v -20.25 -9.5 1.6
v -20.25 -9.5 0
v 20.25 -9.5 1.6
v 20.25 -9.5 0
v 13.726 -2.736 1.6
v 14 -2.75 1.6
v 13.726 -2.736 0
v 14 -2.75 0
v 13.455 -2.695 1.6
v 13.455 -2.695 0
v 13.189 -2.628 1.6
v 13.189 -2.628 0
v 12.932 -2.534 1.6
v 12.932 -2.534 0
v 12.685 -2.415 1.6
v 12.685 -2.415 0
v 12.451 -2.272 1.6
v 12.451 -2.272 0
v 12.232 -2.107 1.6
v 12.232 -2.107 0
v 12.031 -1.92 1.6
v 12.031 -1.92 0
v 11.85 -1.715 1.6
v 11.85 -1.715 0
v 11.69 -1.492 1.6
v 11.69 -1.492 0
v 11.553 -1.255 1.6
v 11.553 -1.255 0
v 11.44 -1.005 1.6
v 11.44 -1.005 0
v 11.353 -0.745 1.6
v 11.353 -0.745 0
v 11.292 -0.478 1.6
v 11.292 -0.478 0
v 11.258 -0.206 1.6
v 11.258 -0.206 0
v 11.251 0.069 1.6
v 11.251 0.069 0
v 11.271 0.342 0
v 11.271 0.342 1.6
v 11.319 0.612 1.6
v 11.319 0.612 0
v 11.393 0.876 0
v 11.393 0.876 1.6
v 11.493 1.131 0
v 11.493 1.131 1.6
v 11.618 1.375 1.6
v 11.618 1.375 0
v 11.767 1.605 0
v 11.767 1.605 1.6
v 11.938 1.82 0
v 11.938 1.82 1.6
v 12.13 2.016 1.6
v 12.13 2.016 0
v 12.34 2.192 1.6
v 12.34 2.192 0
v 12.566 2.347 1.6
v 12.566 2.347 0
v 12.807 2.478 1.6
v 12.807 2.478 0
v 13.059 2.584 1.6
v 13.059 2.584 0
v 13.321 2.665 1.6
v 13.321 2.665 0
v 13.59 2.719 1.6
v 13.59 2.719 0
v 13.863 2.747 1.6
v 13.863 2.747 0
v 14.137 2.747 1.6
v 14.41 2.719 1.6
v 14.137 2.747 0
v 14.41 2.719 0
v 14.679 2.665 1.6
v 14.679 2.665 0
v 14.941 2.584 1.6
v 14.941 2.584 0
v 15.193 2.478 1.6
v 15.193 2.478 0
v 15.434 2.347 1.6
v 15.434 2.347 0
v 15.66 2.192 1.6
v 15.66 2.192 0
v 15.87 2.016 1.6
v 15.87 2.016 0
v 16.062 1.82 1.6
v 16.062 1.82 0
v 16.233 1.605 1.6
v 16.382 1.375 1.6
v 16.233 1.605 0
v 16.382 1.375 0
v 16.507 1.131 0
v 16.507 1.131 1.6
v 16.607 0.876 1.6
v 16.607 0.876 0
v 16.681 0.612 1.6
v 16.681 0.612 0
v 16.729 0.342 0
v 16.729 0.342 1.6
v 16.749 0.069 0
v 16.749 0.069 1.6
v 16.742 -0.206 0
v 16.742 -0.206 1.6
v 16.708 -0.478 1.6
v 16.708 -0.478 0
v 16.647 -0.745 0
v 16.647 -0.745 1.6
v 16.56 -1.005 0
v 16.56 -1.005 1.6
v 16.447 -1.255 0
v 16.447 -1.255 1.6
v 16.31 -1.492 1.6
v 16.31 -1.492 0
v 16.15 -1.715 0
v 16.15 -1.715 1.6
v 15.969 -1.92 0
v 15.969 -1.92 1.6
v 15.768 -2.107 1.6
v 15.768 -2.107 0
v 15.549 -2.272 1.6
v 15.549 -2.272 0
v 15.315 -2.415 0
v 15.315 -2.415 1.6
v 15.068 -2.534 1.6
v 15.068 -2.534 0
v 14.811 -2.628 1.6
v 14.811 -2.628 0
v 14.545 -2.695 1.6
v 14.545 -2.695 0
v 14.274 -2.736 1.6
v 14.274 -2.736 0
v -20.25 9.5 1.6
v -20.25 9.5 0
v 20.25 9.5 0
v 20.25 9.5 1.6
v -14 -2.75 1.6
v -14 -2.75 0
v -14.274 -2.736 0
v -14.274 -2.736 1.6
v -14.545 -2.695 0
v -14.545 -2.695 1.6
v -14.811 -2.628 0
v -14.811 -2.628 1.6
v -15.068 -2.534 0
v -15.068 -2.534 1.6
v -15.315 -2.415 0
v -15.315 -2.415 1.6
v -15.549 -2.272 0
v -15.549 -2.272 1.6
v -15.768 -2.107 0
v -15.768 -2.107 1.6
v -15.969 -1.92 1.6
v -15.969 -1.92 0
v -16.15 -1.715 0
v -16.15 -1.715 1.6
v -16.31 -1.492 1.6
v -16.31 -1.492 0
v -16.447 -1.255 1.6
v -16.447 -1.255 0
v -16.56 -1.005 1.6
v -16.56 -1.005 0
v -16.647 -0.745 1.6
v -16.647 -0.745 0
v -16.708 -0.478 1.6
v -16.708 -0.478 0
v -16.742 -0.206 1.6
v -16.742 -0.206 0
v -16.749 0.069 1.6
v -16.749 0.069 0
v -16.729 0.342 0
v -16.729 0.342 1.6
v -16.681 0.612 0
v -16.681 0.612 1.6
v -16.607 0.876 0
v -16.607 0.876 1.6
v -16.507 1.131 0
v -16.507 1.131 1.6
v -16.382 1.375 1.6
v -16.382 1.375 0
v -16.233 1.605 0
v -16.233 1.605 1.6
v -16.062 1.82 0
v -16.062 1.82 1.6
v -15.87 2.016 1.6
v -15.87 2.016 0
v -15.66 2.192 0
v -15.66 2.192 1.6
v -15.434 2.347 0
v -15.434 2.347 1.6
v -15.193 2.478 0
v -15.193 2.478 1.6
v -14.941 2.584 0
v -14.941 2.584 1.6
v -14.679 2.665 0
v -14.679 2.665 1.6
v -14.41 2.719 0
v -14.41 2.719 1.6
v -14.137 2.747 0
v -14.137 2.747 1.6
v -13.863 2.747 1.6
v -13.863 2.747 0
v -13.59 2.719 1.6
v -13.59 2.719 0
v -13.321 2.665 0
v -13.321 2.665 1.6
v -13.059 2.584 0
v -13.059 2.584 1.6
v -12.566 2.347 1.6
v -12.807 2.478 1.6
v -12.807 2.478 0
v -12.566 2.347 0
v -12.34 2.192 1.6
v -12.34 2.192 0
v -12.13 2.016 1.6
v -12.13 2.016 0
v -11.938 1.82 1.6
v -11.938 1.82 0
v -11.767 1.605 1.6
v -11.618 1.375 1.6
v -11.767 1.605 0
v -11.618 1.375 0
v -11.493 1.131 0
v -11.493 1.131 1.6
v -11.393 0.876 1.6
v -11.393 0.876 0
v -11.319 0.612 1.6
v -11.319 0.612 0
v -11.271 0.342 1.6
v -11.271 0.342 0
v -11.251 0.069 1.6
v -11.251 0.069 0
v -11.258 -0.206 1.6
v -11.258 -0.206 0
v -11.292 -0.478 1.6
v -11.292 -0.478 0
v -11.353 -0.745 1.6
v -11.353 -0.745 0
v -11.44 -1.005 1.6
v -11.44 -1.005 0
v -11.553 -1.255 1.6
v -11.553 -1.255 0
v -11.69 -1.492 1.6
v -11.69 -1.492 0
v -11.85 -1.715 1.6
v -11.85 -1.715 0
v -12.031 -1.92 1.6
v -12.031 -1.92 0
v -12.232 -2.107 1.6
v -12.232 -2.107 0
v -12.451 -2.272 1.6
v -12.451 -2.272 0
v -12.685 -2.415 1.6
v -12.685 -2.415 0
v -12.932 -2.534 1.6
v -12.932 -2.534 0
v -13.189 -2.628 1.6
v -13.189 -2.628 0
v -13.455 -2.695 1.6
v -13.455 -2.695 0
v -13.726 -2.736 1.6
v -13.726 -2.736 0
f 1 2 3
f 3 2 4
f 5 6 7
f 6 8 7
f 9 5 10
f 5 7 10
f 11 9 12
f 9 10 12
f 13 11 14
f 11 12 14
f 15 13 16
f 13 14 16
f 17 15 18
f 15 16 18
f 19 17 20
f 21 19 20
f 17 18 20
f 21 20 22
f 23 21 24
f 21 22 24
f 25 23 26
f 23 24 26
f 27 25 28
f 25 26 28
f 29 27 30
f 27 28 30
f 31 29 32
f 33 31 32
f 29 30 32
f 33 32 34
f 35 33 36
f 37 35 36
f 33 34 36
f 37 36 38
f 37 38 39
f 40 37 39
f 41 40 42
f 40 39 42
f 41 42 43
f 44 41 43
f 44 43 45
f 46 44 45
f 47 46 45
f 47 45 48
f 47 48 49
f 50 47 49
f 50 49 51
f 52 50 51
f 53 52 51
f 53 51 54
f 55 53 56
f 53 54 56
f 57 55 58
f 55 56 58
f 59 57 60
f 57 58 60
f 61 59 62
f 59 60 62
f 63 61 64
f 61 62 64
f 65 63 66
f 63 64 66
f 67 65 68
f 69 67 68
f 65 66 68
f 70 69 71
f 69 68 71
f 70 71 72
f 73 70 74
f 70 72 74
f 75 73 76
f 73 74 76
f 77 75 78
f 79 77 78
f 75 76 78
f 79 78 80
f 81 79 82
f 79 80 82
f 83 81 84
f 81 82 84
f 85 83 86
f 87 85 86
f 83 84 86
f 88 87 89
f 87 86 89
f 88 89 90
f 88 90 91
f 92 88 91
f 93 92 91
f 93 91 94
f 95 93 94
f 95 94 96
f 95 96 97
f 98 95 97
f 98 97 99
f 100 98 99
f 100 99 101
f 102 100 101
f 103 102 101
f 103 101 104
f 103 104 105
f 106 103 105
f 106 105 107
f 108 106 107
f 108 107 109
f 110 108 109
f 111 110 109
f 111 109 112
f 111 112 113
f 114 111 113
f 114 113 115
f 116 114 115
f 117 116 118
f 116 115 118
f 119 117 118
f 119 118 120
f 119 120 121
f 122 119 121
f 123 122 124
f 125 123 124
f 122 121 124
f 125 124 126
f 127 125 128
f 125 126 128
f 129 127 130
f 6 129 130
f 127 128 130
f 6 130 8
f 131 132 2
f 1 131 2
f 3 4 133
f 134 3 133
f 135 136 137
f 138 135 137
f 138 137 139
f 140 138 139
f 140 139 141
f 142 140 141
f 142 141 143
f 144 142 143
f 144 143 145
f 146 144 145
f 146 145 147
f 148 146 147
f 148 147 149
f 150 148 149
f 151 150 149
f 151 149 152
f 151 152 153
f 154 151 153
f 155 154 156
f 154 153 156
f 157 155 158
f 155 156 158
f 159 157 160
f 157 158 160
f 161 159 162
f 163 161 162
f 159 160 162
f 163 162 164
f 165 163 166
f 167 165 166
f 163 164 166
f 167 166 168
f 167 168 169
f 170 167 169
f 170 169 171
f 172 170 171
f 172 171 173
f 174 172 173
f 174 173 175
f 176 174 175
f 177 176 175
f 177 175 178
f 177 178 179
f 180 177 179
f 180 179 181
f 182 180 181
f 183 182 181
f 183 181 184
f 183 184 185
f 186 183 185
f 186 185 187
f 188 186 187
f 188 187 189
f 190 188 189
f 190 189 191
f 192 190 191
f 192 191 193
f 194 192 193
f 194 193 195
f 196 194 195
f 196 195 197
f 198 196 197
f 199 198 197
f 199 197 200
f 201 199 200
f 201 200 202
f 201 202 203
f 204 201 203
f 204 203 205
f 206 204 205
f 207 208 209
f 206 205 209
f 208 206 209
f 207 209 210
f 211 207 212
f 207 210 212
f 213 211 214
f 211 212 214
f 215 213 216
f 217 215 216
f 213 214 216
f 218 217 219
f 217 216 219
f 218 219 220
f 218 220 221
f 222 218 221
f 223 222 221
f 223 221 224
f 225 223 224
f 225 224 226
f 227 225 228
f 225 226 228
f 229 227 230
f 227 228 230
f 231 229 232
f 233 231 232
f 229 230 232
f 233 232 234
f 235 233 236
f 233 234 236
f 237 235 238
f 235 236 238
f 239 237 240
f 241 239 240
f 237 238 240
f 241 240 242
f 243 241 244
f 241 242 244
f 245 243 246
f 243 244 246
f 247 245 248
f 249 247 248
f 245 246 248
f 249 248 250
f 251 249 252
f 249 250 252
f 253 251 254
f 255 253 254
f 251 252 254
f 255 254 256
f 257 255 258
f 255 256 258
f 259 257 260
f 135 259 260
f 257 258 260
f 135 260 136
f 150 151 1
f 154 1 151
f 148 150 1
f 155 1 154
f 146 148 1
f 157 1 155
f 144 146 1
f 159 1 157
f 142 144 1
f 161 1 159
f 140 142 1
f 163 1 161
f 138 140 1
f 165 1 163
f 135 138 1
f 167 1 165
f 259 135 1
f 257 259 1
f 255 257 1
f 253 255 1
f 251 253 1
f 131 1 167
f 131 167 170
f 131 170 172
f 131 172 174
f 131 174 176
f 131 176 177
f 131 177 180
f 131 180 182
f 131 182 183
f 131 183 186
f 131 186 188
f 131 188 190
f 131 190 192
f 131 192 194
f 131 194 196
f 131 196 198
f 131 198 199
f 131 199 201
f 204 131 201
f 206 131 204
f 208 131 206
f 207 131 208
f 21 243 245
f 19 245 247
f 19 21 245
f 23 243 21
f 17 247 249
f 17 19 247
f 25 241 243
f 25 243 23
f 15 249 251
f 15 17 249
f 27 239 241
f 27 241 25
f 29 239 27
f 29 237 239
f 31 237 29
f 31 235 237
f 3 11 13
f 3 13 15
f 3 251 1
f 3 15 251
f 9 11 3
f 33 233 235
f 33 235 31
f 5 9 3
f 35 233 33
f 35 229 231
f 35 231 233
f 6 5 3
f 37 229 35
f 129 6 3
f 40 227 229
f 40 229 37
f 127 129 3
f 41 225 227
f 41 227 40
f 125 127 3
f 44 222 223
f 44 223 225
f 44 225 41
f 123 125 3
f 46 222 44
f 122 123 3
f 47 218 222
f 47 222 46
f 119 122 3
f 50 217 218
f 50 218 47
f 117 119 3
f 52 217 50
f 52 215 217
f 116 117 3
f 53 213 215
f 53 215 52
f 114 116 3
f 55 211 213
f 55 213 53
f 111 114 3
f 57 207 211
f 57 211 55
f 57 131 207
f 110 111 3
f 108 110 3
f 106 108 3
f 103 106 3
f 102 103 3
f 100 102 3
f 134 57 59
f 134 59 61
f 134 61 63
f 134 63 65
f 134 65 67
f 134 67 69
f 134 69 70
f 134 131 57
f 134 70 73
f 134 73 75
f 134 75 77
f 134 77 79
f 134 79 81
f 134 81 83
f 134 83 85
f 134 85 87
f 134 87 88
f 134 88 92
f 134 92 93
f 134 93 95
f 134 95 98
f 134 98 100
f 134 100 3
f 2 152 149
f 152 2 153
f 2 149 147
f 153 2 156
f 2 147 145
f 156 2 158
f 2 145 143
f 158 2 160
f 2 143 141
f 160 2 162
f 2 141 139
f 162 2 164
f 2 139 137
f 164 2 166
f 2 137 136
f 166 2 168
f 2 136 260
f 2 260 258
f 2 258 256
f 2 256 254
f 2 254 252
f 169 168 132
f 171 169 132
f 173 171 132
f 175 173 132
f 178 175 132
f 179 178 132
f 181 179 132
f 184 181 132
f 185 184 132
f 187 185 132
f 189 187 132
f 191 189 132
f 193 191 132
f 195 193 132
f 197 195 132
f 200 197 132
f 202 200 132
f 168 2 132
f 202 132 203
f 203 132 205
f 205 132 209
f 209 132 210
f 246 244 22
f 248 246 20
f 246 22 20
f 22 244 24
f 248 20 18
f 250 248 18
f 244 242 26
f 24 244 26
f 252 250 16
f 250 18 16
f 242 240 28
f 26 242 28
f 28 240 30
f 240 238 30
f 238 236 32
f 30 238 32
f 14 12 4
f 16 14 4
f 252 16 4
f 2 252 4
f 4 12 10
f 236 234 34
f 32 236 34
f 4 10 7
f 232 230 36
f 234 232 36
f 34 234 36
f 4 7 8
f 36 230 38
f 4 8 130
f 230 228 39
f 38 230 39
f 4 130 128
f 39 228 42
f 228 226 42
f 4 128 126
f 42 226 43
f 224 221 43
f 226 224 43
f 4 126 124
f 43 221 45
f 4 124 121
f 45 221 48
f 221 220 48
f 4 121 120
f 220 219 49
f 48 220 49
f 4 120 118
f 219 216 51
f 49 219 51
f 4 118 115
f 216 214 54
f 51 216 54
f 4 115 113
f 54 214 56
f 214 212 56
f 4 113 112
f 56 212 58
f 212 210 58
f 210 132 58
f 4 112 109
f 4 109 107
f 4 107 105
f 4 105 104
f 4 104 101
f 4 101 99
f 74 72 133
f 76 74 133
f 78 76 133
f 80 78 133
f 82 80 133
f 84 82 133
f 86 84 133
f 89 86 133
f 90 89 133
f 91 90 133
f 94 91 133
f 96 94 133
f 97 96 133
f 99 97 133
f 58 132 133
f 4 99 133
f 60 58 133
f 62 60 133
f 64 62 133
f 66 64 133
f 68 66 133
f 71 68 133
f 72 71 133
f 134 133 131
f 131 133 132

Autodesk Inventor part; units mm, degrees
ref_plane "YZ Plane" through (0, 0, 0) normal (1, 0, 0) x (0, 1, 0)
ref_plane "XZ Plane" through (0, 0, 0) normal (0, 1, 0) x (-1, 0, 0)
ref_plane "XY Plane" through (0, 0, 0) normal (0, 0, 1) x (1, 0, 0)
sketch "Sketch1" plane through (0, 0, 0) normal (0, 0, 1) x (1, 0, 0)
  line L0 (-20.25, -9.5) -> (20.25, -9.5)
  line L1 (20.25, -9.5) -> (20.25, 9.5)
  line L2 (20.25, 9.5) -> (-20.25, 9.5)
  line L3 (-20.25, 9.5) -> (-20.25, -9.5)
  line L4 (-20.25, -9.5) -> (20.25, 9.5) construction
  line L5 (20.25, -9.5) -> (-20.25, 9.5) construction
  point P0 (0, 0)
  dimension "d0" = 40.5
  dimension "d1" = 19
extrude "Extrusion1" add sketch "Sketch1" along normal blind 1.6
sketch "Sketch2" plane through (0, 0, 1.6) normal (0, 0, 1) x (1, 0, 0)
  line L0 (-14, 0) -> (14, 0) construction
  point P0 (0, 0)
  point P1 (0, 0)
  dimension "d4" = 28
hole "Hole1" at (-14, 0, 1.6) at (14, 0, 1.6) direction (0, 0, -1) diameter 5.5 depth 8 tip angle 118 clearance for "Countersunk Flat Head Screw DIN EN ISO 2009" size "M5" standard "DIN"
properties part number "Platine_Gleichrichter"
